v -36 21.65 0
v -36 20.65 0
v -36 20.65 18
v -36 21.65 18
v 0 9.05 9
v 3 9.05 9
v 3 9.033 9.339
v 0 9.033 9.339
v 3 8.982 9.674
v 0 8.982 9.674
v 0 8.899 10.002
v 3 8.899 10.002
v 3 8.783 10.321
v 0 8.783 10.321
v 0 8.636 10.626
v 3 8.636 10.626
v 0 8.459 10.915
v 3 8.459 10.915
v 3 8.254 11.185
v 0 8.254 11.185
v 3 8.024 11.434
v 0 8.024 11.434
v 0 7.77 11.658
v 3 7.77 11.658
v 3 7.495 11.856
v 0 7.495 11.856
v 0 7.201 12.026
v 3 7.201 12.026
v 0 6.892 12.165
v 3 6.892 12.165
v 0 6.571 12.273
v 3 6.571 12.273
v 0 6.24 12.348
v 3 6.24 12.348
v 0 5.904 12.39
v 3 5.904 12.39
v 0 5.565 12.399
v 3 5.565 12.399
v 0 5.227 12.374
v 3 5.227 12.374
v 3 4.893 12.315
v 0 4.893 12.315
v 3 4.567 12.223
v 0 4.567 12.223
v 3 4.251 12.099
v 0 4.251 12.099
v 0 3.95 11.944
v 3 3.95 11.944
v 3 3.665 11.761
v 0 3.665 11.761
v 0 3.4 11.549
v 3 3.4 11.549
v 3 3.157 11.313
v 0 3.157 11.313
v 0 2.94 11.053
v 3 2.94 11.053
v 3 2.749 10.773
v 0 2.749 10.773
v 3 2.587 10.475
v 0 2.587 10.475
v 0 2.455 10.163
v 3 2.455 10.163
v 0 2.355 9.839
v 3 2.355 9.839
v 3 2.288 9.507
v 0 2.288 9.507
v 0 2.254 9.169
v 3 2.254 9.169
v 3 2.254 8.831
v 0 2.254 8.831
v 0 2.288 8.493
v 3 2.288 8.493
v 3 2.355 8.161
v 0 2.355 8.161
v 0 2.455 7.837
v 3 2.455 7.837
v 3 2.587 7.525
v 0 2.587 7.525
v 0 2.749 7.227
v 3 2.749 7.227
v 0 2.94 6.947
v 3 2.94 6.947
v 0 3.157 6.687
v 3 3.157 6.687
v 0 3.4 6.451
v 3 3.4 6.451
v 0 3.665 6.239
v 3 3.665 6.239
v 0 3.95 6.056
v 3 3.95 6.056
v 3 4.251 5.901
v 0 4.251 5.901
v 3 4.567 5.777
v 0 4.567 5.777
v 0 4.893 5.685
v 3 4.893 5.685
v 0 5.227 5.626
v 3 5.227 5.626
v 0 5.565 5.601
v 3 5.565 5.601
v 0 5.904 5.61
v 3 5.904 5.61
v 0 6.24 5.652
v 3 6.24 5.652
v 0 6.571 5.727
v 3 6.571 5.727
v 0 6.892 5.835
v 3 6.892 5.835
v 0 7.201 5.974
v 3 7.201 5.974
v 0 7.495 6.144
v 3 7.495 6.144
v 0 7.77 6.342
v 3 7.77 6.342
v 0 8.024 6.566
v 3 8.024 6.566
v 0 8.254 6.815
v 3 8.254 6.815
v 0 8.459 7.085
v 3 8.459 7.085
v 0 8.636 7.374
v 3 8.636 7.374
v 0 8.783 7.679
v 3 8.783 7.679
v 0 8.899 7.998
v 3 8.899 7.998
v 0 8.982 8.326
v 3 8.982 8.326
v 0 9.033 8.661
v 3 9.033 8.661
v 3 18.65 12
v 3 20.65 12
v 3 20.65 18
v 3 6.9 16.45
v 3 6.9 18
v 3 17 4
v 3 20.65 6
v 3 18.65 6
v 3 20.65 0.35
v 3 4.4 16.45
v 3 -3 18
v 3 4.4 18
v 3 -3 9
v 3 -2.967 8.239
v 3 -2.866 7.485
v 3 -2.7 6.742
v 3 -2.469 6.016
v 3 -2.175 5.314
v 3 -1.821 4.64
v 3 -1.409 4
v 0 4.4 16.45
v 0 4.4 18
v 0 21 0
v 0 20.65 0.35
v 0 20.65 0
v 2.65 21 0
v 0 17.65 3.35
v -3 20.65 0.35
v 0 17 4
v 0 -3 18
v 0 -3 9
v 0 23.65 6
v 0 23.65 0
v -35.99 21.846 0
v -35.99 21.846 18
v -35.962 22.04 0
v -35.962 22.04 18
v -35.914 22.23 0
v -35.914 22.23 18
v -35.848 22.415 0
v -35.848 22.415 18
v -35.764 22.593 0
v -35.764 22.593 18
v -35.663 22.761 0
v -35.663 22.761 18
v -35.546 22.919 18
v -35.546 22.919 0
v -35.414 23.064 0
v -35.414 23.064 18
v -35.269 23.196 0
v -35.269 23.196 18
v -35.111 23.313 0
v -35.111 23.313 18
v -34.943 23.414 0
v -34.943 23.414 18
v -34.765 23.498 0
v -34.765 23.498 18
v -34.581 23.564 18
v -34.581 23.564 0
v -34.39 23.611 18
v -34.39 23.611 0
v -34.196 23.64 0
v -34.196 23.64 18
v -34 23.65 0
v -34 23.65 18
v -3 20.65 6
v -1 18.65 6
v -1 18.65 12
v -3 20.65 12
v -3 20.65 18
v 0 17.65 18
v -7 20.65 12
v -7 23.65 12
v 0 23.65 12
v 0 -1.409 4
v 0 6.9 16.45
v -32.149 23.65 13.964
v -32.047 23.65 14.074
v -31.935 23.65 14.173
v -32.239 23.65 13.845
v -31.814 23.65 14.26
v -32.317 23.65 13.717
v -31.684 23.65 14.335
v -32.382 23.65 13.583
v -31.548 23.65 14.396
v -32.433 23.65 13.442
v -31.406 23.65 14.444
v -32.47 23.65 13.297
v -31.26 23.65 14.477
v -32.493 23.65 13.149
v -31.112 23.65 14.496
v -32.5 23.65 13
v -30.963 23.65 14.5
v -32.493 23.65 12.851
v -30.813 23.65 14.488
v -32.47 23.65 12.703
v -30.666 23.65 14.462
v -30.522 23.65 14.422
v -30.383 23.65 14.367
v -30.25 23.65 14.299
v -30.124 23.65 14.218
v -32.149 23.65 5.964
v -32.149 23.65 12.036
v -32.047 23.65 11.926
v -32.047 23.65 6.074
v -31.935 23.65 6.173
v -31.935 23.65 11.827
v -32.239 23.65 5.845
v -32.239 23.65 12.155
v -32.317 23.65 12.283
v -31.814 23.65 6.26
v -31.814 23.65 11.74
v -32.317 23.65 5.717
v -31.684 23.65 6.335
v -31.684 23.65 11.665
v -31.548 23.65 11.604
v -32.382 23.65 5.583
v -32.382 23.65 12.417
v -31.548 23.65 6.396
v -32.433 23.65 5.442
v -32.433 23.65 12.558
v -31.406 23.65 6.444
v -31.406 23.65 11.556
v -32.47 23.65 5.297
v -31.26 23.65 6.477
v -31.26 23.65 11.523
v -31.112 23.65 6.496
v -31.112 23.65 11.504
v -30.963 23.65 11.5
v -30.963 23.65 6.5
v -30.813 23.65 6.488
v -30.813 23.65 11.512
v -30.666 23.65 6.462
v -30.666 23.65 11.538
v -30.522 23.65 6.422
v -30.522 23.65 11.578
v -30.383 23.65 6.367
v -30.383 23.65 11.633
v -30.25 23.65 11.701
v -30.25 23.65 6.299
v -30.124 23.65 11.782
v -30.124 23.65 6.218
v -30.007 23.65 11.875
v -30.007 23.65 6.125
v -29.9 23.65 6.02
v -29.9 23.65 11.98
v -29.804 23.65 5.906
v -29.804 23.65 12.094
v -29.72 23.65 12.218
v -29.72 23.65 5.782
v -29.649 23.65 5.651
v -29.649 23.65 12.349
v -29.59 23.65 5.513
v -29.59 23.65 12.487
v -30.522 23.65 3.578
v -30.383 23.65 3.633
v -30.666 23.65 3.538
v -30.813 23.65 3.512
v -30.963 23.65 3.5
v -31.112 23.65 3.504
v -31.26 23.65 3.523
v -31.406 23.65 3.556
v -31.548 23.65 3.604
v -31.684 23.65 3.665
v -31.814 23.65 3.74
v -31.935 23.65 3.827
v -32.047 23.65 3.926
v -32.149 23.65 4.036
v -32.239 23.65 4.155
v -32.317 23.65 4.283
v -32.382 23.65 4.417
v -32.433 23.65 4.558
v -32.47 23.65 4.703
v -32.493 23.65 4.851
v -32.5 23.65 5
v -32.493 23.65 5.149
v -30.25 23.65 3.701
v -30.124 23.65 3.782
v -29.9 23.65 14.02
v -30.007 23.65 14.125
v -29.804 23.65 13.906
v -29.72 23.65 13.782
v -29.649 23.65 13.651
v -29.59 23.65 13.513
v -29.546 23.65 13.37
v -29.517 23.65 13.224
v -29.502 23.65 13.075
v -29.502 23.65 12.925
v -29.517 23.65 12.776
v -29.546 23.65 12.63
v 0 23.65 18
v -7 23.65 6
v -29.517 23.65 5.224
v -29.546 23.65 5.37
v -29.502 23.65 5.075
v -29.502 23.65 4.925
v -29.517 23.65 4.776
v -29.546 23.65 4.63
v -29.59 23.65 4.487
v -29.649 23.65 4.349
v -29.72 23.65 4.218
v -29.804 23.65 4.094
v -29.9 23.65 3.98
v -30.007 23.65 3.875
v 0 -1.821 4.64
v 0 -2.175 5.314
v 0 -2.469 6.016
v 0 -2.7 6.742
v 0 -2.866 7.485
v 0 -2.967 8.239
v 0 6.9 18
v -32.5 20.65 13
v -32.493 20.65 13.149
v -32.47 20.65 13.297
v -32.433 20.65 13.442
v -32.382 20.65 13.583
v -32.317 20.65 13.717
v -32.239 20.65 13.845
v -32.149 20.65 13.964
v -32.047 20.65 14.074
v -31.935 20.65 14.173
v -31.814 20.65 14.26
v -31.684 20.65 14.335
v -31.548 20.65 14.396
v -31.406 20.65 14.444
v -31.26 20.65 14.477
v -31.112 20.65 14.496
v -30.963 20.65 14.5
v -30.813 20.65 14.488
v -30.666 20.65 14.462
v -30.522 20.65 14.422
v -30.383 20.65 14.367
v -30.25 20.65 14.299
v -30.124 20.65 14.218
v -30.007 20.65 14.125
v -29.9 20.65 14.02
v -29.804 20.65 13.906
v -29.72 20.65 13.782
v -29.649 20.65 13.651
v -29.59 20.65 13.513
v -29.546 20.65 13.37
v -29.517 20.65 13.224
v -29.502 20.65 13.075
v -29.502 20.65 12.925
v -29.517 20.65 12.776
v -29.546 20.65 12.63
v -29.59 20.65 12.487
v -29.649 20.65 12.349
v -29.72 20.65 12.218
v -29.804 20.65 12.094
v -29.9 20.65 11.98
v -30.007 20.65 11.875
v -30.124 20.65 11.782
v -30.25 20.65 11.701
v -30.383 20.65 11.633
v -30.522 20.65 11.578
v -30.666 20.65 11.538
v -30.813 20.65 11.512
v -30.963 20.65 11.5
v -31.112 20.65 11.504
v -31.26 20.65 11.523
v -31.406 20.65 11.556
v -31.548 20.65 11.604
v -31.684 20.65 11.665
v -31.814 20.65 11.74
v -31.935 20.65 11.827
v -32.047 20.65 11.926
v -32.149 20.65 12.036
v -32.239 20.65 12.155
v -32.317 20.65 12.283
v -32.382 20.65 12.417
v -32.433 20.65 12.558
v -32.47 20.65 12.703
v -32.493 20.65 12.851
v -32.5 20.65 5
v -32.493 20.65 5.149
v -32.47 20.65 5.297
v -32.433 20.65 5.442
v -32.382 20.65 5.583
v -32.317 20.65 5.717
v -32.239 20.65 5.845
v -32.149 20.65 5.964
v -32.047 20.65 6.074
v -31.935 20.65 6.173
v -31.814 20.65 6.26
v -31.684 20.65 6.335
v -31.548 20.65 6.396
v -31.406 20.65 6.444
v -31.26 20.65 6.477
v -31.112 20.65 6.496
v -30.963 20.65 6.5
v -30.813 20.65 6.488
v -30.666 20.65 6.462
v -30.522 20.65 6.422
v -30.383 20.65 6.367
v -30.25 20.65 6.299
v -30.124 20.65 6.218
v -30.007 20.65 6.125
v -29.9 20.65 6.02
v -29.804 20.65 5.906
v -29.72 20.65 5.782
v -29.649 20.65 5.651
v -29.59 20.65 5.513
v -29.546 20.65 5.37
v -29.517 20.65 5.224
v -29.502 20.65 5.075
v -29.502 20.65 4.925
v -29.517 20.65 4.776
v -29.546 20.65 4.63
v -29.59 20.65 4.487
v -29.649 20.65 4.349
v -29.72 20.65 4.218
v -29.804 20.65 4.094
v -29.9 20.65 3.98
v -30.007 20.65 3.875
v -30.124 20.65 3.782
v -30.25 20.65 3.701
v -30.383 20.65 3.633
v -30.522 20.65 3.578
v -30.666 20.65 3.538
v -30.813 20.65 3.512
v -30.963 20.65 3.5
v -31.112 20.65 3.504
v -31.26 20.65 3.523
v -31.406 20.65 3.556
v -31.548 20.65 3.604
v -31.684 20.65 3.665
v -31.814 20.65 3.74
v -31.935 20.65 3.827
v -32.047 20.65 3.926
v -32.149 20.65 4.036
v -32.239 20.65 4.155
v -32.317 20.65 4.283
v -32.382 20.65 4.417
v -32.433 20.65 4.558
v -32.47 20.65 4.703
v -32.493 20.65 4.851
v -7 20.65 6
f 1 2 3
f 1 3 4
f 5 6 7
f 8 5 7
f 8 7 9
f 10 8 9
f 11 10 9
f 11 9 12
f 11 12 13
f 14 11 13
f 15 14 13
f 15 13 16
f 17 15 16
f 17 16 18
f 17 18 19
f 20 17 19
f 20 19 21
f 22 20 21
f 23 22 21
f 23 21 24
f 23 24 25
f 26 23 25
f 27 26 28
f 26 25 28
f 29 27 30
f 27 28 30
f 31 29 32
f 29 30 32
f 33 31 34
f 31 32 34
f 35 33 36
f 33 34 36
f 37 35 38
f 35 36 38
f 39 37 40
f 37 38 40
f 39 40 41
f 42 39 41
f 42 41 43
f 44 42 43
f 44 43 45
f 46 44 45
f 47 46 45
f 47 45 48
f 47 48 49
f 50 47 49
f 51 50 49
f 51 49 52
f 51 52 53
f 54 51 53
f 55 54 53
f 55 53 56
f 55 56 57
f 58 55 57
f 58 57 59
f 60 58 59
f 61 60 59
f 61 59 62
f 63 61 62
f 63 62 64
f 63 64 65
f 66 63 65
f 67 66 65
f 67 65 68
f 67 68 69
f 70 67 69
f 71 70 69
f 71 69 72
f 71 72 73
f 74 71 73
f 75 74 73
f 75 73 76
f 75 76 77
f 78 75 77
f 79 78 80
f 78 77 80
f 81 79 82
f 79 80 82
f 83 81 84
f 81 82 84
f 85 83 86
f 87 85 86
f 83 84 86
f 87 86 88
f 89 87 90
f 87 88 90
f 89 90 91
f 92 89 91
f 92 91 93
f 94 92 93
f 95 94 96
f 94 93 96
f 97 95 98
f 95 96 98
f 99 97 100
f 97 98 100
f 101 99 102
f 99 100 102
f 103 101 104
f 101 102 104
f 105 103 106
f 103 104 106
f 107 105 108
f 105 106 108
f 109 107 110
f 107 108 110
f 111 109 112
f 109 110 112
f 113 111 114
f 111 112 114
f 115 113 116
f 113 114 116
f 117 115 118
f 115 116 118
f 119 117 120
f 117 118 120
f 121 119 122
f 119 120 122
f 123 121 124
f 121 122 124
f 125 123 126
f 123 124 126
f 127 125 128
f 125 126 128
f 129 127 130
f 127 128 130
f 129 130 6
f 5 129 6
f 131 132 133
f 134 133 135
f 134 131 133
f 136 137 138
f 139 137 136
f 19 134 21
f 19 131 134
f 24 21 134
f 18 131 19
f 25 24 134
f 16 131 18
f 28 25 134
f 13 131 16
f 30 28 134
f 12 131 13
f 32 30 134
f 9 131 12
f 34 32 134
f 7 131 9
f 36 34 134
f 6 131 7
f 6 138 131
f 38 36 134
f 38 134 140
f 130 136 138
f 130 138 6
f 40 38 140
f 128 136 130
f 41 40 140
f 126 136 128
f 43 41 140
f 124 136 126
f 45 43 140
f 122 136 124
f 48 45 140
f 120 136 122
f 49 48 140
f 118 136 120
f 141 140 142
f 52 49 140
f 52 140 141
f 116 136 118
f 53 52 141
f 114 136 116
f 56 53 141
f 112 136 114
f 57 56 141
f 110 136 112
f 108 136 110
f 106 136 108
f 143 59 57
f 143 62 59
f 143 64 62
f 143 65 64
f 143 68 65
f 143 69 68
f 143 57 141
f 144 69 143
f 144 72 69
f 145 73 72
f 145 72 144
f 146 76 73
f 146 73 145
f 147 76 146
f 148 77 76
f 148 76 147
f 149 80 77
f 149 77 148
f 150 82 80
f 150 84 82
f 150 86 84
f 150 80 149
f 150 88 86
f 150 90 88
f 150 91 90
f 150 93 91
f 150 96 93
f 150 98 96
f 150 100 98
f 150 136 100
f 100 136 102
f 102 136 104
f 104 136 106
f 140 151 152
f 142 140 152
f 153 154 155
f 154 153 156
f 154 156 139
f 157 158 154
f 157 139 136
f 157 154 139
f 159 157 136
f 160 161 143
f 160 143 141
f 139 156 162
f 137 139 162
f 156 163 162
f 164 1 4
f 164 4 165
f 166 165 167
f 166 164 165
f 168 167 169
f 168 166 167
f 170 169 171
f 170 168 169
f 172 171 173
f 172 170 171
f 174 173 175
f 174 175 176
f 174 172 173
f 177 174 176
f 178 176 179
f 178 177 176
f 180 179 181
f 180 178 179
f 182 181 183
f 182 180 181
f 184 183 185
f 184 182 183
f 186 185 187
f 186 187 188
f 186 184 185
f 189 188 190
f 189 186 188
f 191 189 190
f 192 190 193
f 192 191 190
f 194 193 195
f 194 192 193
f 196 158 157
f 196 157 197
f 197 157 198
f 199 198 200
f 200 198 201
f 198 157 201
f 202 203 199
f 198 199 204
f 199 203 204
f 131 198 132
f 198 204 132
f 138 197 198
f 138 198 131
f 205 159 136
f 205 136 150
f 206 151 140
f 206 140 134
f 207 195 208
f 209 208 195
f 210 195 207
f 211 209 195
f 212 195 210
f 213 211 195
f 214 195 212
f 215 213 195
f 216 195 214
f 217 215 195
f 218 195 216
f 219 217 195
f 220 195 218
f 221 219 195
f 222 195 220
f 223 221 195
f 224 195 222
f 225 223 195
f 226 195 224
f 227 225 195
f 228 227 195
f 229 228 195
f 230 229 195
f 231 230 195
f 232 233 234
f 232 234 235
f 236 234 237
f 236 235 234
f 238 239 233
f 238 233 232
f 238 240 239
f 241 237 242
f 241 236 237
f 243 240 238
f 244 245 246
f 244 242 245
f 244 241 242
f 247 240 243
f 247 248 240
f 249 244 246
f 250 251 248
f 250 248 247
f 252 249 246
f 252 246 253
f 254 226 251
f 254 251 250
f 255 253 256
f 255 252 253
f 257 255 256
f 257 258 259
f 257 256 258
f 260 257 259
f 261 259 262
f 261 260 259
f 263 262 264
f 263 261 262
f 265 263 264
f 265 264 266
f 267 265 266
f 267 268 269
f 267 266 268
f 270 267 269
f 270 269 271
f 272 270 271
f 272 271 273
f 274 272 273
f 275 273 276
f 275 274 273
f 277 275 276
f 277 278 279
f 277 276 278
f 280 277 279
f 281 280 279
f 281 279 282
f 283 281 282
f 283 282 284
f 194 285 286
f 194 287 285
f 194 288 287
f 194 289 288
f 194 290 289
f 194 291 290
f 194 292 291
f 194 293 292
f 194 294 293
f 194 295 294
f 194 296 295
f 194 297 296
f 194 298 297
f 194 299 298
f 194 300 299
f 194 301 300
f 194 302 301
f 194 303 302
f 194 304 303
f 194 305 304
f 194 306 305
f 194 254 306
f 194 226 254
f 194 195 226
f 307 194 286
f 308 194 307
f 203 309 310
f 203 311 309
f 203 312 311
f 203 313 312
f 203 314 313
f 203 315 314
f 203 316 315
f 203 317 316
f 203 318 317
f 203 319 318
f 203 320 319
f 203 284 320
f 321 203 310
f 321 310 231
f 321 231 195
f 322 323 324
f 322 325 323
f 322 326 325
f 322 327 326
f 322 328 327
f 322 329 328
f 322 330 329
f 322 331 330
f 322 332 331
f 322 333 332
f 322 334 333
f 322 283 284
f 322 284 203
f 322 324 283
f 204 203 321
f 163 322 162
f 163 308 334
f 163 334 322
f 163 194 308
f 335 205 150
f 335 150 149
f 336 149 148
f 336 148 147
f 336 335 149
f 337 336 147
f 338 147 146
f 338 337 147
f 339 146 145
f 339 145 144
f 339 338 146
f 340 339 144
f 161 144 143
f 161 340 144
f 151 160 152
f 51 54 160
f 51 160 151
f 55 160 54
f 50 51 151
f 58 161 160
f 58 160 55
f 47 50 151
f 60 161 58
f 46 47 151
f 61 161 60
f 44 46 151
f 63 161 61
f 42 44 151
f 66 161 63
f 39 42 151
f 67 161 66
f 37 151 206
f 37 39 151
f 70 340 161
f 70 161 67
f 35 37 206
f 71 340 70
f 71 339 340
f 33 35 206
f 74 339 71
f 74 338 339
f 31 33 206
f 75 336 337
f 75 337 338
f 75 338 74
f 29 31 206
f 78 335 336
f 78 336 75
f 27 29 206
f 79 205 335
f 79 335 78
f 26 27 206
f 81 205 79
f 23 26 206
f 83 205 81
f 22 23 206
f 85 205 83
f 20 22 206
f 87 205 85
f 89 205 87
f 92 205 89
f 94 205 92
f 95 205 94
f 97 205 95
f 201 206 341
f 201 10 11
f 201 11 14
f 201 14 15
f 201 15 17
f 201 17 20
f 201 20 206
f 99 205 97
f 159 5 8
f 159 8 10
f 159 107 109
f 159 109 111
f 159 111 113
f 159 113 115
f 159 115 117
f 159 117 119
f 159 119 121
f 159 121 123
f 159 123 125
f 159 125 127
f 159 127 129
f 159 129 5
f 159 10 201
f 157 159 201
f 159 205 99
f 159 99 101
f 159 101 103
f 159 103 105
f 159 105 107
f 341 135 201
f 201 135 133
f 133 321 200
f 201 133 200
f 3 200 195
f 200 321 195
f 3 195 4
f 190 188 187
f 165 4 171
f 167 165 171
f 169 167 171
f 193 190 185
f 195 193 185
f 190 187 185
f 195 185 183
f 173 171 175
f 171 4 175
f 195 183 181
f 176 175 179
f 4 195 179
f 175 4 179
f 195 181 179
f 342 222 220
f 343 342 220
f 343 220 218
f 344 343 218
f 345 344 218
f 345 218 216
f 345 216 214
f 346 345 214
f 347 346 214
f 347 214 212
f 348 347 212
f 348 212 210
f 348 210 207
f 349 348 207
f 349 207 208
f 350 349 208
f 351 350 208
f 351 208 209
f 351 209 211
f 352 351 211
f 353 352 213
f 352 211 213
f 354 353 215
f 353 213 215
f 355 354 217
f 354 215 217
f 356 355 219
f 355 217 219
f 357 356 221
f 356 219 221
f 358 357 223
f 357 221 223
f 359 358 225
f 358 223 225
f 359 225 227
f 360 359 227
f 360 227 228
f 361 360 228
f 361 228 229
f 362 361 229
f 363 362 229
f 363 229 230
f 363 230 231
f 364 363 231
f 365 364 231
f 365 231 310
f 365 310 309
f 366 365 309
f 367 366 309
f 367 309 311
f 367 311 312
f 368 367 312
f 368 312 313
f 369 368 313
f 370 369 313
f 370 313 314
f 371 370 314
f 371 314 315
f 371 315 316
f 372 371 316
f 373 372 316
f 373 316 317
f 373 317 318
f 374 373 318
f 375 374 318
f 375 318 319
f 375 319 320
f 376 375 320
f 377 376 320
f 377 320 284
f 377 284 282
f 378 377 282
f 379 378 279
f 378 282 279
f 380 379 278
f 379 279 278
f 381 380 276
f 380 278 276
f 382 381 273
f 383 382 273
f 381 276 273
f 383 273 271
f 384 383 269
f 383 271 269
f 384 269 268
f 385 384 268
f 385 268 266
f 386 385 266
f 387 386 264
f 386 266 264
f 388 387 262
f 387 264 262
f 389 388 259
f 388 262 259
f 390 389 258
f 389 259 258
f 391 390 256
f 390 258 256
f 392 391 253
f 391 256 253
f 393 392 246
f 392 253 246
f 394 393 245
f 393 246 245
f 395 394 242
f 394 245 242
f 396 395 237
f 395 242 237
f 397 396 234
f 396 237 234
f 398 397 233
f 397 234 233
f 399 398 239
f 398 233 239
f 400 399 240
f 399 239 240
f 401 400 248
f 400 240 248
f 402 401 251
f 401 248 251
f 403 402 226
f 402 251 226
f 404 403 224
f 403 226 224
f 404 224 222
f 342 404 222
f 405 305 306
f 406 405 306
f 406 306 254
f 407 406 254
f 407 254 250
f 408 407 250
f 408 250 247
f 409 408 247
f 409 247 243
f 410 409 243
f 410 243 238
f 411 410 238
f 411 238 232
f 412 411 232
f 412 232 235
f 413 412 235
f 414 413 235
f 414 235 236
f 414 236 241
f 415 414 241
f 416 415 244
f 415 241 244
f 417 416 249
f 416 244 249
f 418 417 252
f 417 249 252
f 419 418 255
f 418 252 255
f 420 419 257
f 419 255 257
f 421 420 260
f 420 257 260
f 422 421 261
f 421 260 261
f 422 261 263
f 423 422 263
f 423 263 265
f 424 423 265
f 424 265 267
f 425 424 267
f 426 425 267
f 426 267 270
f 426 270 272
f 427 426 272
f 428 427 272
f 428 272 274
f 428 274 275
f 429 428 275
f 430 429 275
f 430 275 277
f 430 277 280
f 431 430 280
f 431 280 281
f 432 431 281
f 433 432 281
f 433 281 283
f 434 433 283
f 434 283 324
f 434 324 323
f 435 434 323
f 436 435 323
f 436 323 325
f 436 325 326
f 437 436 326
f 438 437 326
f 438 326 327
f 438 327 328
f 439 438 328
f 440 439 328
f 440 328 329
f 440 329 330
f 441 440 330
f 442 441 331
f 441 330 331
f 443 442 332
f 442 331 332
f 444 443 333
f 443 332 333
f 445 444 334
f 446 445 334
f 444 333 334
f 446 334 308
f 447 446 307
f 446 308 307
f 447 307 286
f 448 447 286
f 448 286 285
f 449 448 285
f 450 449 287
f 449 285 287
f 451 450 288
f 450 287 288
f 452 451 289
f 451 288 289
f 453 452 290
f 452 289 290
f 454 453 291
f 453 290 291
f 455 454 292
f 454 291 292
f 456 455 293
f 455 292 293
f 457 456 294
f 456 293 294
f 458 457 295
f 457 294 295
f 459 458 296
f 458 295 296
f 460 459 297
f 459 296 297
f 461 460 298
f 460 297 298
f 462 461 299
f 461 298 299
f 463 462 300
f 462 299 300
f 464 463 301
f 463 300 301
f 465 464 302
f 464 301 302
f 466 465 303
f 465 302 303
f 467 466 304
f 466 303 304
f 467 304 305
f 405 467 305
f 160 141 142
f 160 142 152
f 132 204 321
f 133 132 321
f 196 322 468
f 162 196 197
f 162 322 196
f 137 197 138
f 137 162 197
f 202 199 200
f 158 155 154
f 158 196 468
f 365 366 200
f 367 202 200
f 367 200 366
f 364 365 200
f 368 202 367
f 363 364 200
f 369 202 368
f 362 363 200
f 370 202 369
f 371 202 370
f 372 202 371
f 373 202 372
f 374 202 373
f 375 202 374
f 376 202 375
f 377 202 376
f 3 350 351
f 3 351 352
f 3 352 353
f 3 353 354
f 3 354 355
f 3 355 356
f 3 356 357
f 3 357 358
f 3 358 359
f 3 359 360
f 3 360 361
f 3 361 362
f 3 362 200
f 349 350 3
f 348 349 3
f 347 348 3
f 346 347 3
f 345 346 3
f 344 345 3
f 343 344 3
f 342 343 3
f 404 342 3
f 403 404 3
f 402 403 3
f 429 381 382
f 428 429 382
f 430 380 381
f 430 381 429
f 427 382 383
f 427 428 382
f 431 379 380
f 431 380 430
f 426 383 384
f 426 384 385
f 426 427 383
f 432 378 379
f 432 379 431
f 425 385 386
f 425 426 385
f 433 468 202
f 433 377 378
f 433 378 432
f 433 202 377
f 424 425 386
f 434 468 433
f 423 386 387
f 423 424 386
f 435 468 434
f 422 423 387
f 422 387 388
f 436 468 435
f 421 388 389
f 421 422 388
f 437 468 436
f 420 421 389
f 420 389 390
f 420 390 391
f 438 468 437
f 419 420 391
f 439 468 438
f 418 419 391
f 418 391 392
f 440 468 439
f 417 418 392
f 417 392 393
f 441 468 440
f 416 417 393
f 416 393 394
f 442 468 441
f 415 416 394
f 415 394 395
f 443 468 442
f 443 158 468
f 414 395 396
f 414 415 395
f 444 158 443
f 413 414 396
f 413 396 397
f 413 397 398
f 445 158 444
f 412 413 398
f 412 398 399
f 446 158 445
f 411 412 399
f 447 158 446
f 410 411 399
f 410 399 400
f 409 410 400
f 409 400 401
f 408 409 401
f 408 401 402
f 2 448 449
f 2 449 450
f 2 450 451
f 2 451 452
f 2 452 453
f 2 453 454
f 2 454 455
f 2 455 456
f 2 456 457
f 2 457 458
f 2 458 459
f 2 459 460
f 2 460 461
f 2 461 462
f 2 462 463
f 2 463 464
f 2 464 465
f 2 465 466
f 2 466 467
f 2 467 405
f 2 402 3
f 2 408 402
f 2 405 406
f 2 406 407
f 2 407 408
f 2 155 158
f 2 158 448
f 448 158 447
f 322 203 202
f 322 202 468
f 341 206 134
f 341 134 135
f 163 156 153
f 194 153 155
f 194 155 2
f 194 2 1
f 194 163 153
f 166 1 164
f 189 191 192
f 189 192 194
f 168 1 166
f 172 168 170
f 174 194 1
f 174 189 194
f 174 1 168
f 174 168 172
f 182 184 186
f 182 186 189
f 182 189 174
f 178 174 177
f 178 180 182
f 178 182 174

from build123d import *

# Parameters (mm, degrees)
SALIENTE_EXTRUIR1_DEPTH = 18
CROQUIS2_R              = 3.4
CORTAR_EXTRUIR1_DEPTH   = 22
CROQUIS3_R              = 1.5
CORTAR_EXTRUIR2_DEPTH   = 22
CROQUIS4_W              = 1.55
CROQUIS4_H              = 2.5
CORTAR_EXTRUIR3_DEPTH   = 47.683139164
CHAFL_N1_SIZE           = 3
CROQUIS5_W              = 10
CROQUIS5_H              = 6
CORTAR_EXTRUIR4_DEPTH   = 5


with BuildPart() as part:
    # Croquis1 → Saliente-Extruir1 (new body)
    with BuildSketch(Plane.XY):
        with BuildLine():
            Line((0, -6.350148368), (0, 20.649851632))
            Line((0, 20.649851632), (-36, 20.649851632))
            Line((-36, 20.649851632), (-36, 21.649851632))
            ThreePointArc((-36, 21.649851632), (-35.414213562, 23.064065194), (-34, 23.649851632))
            Line((-34, 23.649851632), (3, 23.649851632))
            Line((3, 23.649851632), (3, -6.350148368))
            Line((3, -6.350148368), (0, -6.350148368))
        make_face()
    extrude(amount=SALIENTE_EXTRUIR1_DEPTH)

    # Croquis2 → Cortar-Extruir1 (cut)
    with BuildSketch(Plane(origin=(3, 0, 0), x_dir=(0, 0, -1), z_dir=(1, 0, 0))):
        with Locations(Location((-9, 5.649851632, 0), (0, 0, 90))):
            Circle(CROQUIS2_R)
    extrude(amount=-CORTAR_EXTRUIR1_DEPTH, mode=Mode.SUBTRACT)

    # Croquis3 → Cortar-Extruir2 (cut)
    with BuildSketch(Plane(origin=(0, 23.649851632, 0), x_dir=(1, 0, 0), z_dir=(0, 1, 0))):
        with Locations(Location((-31, -5, 0), (0, 0, 180))):
            Circle(CROQUIS3_R)
        with Locations(Location((-31, -13, 0), (0, 0, 180))):
            Circle(CROQUIS3_R)
    extrude(amount=-CORTAR_EXTRUIR2_DEPTH, mode=Mode.SUBTRACT)

    # Croquis4 → Cortar-Extruir3 (cut, through all)
    with BuildSketch(Plane.ZY):
        with BuildLine():
            Line((0, 20.999851632), (4, 16.999851632))
            Line((4, 16.999851632), (4, -1.408653875))
            ThreePointArc((4, -1.408653875), (6.37641206, -2.59267749), (9, -3.000148368))
            Line((9, -3.000148368), (18, -3.000148368))
            Line((18, -3.000148368), (18, -6.350148368))
            Line((18, -6.350148368), (0, -6.350148368))
            Line((0, -6.350148368), (0, 20.999851632))
        make_face()
        with Locations((17.225, 5.649851632)):
            Rectangle(CROQUIS4_W, CROQUIS4_H)
    extrude(amount=-CORTAR_EXTRUIR3_DEPTH, mode=Mode.SUBTRACT)

    # Chaflán1
    chafl_n1_edges = [part.edges().sort_by_distance(p)[0] for p in [
        (3, 23.649851632, 9),
        (0, 20.649851632, 9.175),
    ]]
    chamfer(chafl_n1_edges, length=CHAFL_N1_SIZE)

    # Croquis5 → Cortar-Extruir4 (cut)
    with BuildSketch(Plane(origin=(0, 23.649851632, 0), x_dir=(1, 0, 0), z_dir=(0, 1, 0))):
        with Locations((-2, -9)):
            Rectangle(CROQUIS5_W, CROQUIS5_H)
    extrude(amount=-CORTAR_EXTRUIR4_DEPTH, mode=Mode.SUBTRACT)


solid = part.part
